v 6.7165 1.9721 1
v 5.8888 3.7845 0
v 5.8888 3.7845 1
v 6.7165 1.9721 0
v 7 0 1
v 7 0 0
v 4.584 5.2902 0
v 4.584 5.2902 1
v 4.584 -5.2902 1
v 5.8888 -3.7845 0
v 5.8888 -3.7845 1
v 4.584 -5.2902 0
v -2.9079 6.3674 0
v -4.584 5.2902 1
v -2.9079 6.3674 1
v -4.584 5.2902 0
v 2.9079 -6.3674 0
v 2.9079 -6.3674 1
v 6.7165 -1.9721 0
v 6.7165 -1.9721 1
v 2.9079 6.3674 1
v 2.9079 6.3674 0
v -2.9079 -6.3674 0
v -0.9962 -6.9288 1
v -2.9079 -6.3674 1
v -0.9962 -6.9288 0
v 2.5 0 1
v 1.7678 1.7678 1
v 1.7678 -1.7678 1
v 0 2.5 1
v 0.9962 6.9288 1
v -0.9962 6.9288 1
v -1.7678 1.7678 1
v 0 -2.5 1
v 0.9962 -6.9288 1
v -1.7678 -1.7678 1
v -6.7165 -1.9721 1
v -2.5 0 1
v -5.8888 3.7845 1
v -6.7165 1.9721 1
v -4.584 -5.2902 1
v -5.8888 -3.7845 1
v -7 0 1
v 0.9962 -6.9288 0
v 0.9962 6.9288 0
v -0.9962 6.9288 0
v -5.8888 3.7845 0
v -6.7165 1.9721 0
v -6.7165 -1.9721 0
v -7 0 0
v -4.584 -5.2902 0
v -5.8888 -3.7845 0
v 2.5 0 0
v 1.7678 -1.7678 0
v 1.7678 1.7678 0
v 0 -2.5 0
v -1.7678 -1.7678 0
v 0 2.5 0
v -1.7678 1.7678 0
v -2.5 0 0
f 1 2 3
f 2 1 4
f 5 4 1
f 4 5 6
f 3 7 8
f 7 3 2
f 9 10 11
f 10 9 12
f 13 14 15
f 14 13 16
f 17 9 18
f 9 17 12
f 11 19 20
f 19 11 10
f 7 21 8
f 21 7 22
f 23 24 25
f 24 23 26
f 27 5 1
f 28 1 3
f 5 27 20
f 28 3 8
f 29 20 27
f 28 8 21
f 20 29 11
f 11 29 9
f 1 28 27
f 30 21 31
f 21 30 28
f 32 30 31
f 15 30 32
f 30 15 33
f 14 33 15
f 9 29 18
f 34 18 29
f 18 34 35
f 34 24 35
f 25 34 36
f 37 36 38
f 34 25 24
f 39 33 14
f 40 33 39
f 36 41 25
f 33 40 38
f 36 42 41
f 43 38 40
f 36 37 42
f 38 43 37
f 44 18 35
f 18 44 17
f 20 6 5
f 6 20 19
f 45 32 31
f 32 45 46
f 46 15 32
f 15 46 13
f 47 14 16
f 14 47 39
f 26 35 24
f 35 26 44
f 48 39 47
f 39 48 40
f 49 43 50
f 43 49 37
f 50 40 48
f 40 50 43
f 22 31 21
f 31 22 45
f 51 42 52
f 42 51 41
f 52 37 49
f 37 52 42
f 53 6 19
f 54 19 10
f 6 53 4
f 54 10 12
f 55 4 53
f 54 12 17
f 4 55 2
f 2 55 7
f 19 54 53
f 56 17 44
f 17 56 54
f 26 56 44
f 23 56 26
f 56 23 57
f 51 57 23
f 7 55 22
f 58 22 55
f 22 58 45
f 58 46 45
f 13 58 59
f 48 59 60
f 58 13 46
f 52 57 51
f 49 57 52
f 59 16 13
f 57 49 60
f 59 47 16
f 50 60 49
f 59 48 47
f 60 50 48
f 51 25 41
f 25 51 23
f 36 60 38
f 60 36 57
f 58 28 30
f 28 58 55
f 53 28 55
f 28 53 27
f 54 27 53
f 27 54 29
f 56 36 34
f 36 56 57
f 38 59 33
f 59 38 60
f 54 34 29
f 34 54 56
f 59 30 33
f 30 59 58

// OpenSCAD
wall_thickness = 2;
floor_thickness = 4;
corner_radius = 2;

additional_front_padding = 8; // this should make things easier to assemble

esp_width = 52;
esp_depth = 29;
esp_height = 14;

display_outer_width = 27;
display_outer_height = 28;
display_width = 25;
display_height = 14.5;

button_width = 11;
button_height = 14;

front_plate_angle = 20;

epsilon = 0.01;

module esp_spacer() {
    height = 12.6 - 2.5 - 2 - 1.5;
    radius = 1.6;
    outer_radius = radius + 0.8;
    
    difference() {
        cylinder(height, outer_radius, outer_radius, $fn=64);
        cylinder(height, radius, radius, $fn=64);
    }
}

module rounded_rect(width, depth, height, corner_radius) {
    linear_extrude(height, center = false) {
        hull() {
            translate([corner_radius, corner_radius, 0])
                circle(corner_radius, $fn=64);
            translate([corner_radius, depth - corner_radius, 0])
                circle(corner_radius, $fn=64);
            translate([width - corner_radius, depth - corner_radius, 0])
                circle(corner_radius, $fn=64);
            translate([width - corner_radius, corner_radius, 0])
                circle(corner_radius, $fn=64);
        }
    }
}

module esp_mounts() {
    screw_radius = 1.6;
    nut_radius = 6.2 / 2;
    translate([wall_thickness - 1, wall_thickness, -epsilon]) {
        // mount 1
        translate([1.5 + screw_radius, 1 + screw_radius, 0])
            cylinder(floor_thickness + epsilon * 2, screw_radius, screw_radius, $fn=64);
        translate([1.5 + screw_radius, 1 + screw_radius, 0])
            cylinder(2.7, nut_radius, nut_radius, $fn=6);
        // mount 2
        translate([esp_width - 2 - screw_radius, 1 + screw_radius, 0])
            cylinder(floor_thickness + epsilon * 2, screw_radius, screw_radius, $fn=64);
        translate([esp_width - 2 - screw_radius, 1 + screw_radius, 0])
            cylinder(2.7, nut_radius, nut_radius, $fn=6);
        // mount 3
        translate([esp_width - 2 - screw_radius, esp_depth - 1 - screw_radius, 0])
            cylinder(floor_thickness + epsilon * 2, screw_radius, screw_radius, $fn=64);
        translate([esp_width - 2 - screw_radius, esp_depth - 1 - screw_radius, 0])
            cylinder(2.7, nut_radius, nut_radius, $fn=6);
        // mount 4
        translate([1.5 + screw_radius, esp_depth - 1 - screw_radius, 0])
            cylinder(floor_thickness + epsilon * 2, screw_radius, screw_radius, $fn=64);
        translate([1.5 + screw_radius, esp_depth - 1 - screw_radius, 0])
            cylinder(2.7, nut_radius, nut_radius, $fn=6);
    }
}
module esp_bolt_head_diff() {
    head_radius = 1.6;
    height = 20;
    translate([wall_thickness - 2, wall_thickness, -epsilon]) {
        // mount 1
        translate([1 + head_radius, 1 + head_radius, 0])
            cylinder(height + epsilon * 2, head_radius, head_radius, $fn=64);
        // mount 1
        translate([1 + head_radius, esp_depth - 1 - head_radius, 0])
            cylinder(height + epsilon * 2, head_radius, head_radius, $fn=64);
    }
}

module cooling_holes() {
    width = esp_width + wall_thickness * 2;
    depth = esp_depth + wall_thickness * 2;
    height = floor_thickness;
    
    translate([24, depth * 0.30 - 1.5, -epsilon]) {
        translate([0, 0, 0]) 
            rounded_rect(4, 3, height + epsilon * 2, 1);
        translate([6, 0, 0]) 
            rounded_rect(4, 3, height + epsilon * 2, 1);
        translate([12, 0, 0]) 
            rounded_rect(4, 3, height + epsilon * 2, 1);
        translate([18, 0, 0]) 
            rounded_rect(4, 3, height + epsilon * 2, 1);
    }
    translate([24, depth * 0.70 - 1.5, -epsilon]) {
        translate([0, 0, 0]) 
            rounded_rect(4, 3, height + epsilon * 2, 1);
        translate([6, 0, 0]) 
            rounded_rect(4, 3, height + epsilon * 2, 1);
        translate([12, 0, 0]) 
            rounded_rect(4, 3, height + epsilon * 2, 1);
        translate([18, 0, 0]) 
            rounded_rect(4, 3, height + epsilon * 2, 1);
    }
    translate([24 + 3, depth * 0.50 - 1.5, -epsilon]) {
        translate([0, 0, 0]) 
            rounded_rect(4, 3, height + epsilon * 2, 1);
        translate([6, 0, 0]) 
            rounded_rect(4, 3, height + epsilon * 2, 1);
        translate([12, 0, 0]) 
            rounded_rect(4, 3, height + epsilon * 2, 1);
    }
}

module usb_hole() {
    depth = 9;
    height = 3.5;
    translate([-epsilon, wall_thickness + 10, floor_thickness + 7 - height]) {
        cube([10, depth, height], center = false);
    }
}

module bottom_plate() {
    width = esp_width + wall_thickness * 2;
    depth = esp_depth + wall_thickness * 2 + additional_front_padding;
    height = floor_thickness;
    
    difference() {
        rounded_rect(width, depth, height, corner_radius);
        translate([0, additional_front_padding,0]) {
            esp_mounts();
            cooling_holes();
        }
    }
}

module bottom_walls() {
    width = esp_width + wall_thickness * 2;
    depth = esp_depth + wall_thickness * 2 + additional_front_padding;
    height = 7;
    
    difference() {
        translate([0, 0, floor_thickness]) {
            difference() {
                rounded_rect(width, depth, height, corner_radius);
                translate([wall_thickness, wall_thickness, -epsilon])
                    rounded_rect(esp_width, esp_depth + additional_front_padding, height + epsilon * 2, 1);
            }
        }
        translate([0, additional_front_padding,0]) {
            usb_hole();
            esp_bolt_head_diff();
        }
    }
}

module bottom() {
    union() {
        bottom_plate();
        bottom_walls();
    }
}

module front_wall() {
    width = esp_width + wall_thickness * 2;
    height = display_outer_height + 4;
    difference() {
        hull() {
            translate([corner_radius, corner_radius, 0])
                cylinder(height, corner_radius, corner_radius, $fn=64);
            translate([width - corner_radius, corner_radius, 0])
                cylinder(height, corner_radius, corner_radius, $fn=64);
            translate([corner_radius, corner_radius, 0])
                sphere(corner_radius, $fn=64);
            translate([width - corner_radius, corner_radius, 0])
                sphere(corner_radius, $fn=64);
            translate([corner_radius, corner_radius, height])
                sphere(corner_radius, $fn=64);
            translate([width - corner_radius, corner_radius, height])
                sphere(corner_radius, $fn=64);
        }
        // making front wall thinner, as half of corner diameter
        translate([0, corner_radius, -corner_radius])
            cube([width, 5, height + corner_radius * 2], center = false);
    }
}

module display_slot_outline() {
    translate([wall_thickness + 4, -epsilon, 2])
        cube([display_outer_width, wall_thickness * 2 + epsilon * 2, display_outer_height], center = false);
}
module display_slot() {
    translate([wall_thickness + 4, 0, 2]) {
        union() {
            difference() {
                // same as slot outline
                cube([display_outer_width, wall_thickness + epsilon * 2, display_outer_height], center = false);
                // display hole
                translate([1, -epsilon, 5.5 + 2.5])
                    cube([display_width, wall_thickness * 2 + epsilon * 2, display_height], center = false);
                // display lower strip
                translate([1, 0.6, 5.5])
                    cube([display_width, wall_thickness * 2 + epsilon * 2, display_height], center = false);
                // display connector
                translate([display_outer_height / 2 - 5, 0.2, 0])
                    cube([10, wall_thickness * 2 + epsilon * 2, display_height], center = false);
                // display pcb
                translate([0, 1.2, 0])
                    cube([display_outer_width, wall_thickness * 2 + epsilon * 2, display_outer_height], center = false);
            }
            // pocket
            translate([0, 3.5, 0]) {
                cube([display_outer_width, 1.2, display_outer_height * 0.5], center = false);
            }
            translate([0, 0, -1.2]) {
                cube([display_outer_width, 3.5 + 1.2, 1.2], center = false);
            }
            translate([-1.2, 0, -1.2]) {
                cube([1.2, 3.5 + 1.2, display_outer_height * 0.4], center = false);
            }
            translate([display_outer_width, 0, -1.2]) {
                cube([1.2, 3.5 + 1.2, display_outer_height * 0.4], center = false);
            }
        }
    }
}


module button_up_slot_outline() {
    full_width = esp_width + wall_thickness * 2;
    translate([full_width - button_height - 4, -epsilon, display_outer_height - button_height + 5])
        cube([button_height, wall_thickness * 2 + epsilon * 2, button_width], center = false);
}
module button_up_slot() {
    full_width = esp_width + wall_thickness * 2;
    pcb_height = 2;
    
    translate([full_width - button_height - 4, 0, display_outer_height - button_height + 5]) {
        union() {
            difference() {
                union() {
                    cube([button_height, wall_thickness, button_width], center = false);
                    translate([-1, 1, -1]) {
                        cube([3, 3, 3], center = false);
                    }
                }
                translate([0, 1.2, 0]) {
                    cube([button_height, wall_thickness + epsilon * 2, button_width], center = false);
                }
            }
            // pad
            translate([button_height * 0.4, 0, -1.2]) {
                difference() {
                    cube([button_height * 0.6, 1.2 + pcb_height + 1 + 1.2, button_width + 2.4], center = false);
                        
                    translate([-epsilon, 0, 1.2]) {
                        cube([button_height * 0.6, 1.2 + pcb_height + 1, button_width], center = false);
                    }
                }
                
            }
        }
    }
}
module button_down_slot_outline() {
    full_width = esp_width + wall_thickness * 2;
    translate([full_width - button_height - 4, -epsilon, 2])
        cube([button_height, wall_thickness * 2 + epsilon * 2, button_width], center = false);
}
module button_down_slot() {
    full_width = esp_width + wall_thickness * 2;
    pcb_height = 2;
    
    translate([full_width - button_height - 4, 0, 2]) {
        union() {
            difference() {
                union() {
                    cube([button_height, wall_thickness, button_width], center = false);
                    translate([-1, 1, -1]) {
                        cube([3, 3, 3], center = false);
                    }
                }
                translate([0, 1.2, 0]) {
                    cube([button_height, wall_thickness + epsilon * 2, button_width], center = false);
                }
            }
            // pad
            translate([button_height * 0.4, 0, -1.2]) {
                difference() {
                    cube([button_height * 0.6, 1.2 + pcb_height + 1 + 1.2, button_width + 2.4], center = false);
                    translate([-epsilon, 0, 1.2]) {
                        cube([button_height * 0.6, 1.2 + pcb_height + 1, button_width], center = false);
                    }
                }
                
            }
        }
    }
}

module led_slot_outline() {
    led_radius = 2;
    pcb_radius = 7;
    translate([0, 0, -epsilon]) {
        union() {
            cylinder(wall_thickness + epsilon * 2, led_radius, led_radius, $fn = 64);
            cylinder(wall_thickness / 2, pcb_radius, pcb_radius, $fn = 64);
            // todo make nested circle for diffusor?
        }
    }
}

module led_slot() {
    pcb_radius = 7;
    translate([0, 0, -wall_thickness]) {
        difference() {
            union() {
                translate([-pcb_radius - 1, 0, -1.2])
                    cube([2, 2, 2 + 1.2], center = false);
                translate([pcb_radius - 1, 0, -1.2])
                    cube([2, 2, 2 + 1.2], center = false);
                translate([0, -pcb_radius - 1,  -1.2])
                    cube([2, 2, 2 + 1.2], center = false);
                translate([0, pcb_radius - 1,  0])
                    cube([2, 2, 2 ], center = false);
            }
            cylinder(2, pcb_radius, pcb_radius, $fn = 64);
        }
    }
}


module button_ok_slot_outline() {
    translate([0, 0, -epsilon])
        cube([button_height, button_width, wall_thickness * 2 + epsilon * 2 ], center = false);
}
module button_ok_slot() {
    pcb_height = 2;
    
    translate([0, 0, 0]) {
        difference() {
            union() {
                cube([button_height, button_width, wall_thickness ], center = false);
                translate([-1, -1, -2]) {
                    cube([3, 3, 3], center = false);
                }
                translate([-1, button_width - 1, -2]) {
                    cube([3, 3, 3], center = false);
                }
                translate([button_height * 0.6, -1.2, -2]) {
                    cube([button_height * 0.4 + 1.2, button_width + 2.4, 4], center = false);
                }
            }
            translate([0, 0, -pcb_height + 1.2]) {
                cube([button_height, button_width, pcb_height], center = false);
            }
        }
    }
}

module top_wall(width, depth, height) {
    // remove rounded corners from front
    union() {
        rounded_rect(width, depth - 2, height, corner_radius);
        cube([width, depth / 2, height], center = false); 
    }
}


module front_plate() {
    full_width = esp_width + wall_thickness * 2;
    
    union() {
        // front wall with rough holes for components
        difference() {
            front_wall();
            display_slot_outline();
            button_up_slot_outline();
            button_down_slot_outline();
            
            translate([1, corner_radius + 1, 32])
            rotate([0, 90, 0])
                cylinder(full_width - 2, corner_radius, corner_radius, $fn = 64);
        }
        // detailed component slots
        display_slot();
        button_up_slot();
        button_down_slot();
        
        
    }
}

module top_plate() {
    width = esp_width + wall_thickness; // * 2; // half of wall_thickness will be rails for each side
    full_depth = esp_depth + wall_thickness * 2 + additional_front_padding;
    
    front_wall_length = display_outer_height + 4;
    front_wall_x_diff = cos(90 - front_plate_angle) * front_wall_length;
    depth = full_depth - front_wall_x_diff - corner_radius;
    
    height = wall_thickness;
    
    union() {
        // top plate with rough holes for components
        difference() {
            top_wall(width, depth, height);
            translate([width / 2, depth * 0.3, 0])
                led_slot_outline();
            translate([width * 0.7, depth * 0.2, 0])
                button_ok_slot_outline();
        }
        
        translate([0.8, 0.8, height])
            top_wall(width - 0.4, depth - 0.4, 0.5);
        translate([width / 2, depth * 0.3, 0])
            led_slot();
        translate([width * 0.7, depth * 0.2, 0])
            button_ok_slot();
    }
}

module left_wall() {
    front_wall_length = display_outer_height + 4;
    front_wall_x_diff = cos(90 - front_plate_angle) * front_wall_length;
    
    front_plate_height = sin(90 - front_plate_angle) * front_wall_length;
    
    bottom_depth = esp_depth + wall_thickness * 2 + additional_front_padding - corner_radius * 2;
    top_depth = bottom_depth - front_wall_x_diff;
    
    difference() {
        hull() {
            union() {
                cube([wall_thickness, bottom_depth, 1], center = false);
                translate([corner_radius, front_wall_x_diff, front_plate_height])
                rotate([0, 90, 90])
                    cylinder(top_depth, corner_radius, corner_radius, $fn=64);
            }
        }
        translate([wall_thickness, 0, 0])
            cube([corner_radius, bottom_depth + epsilon, front_plate_height + corner_radius], center = false);
        translate([corner_radius + 1, 0, front_plate_height + 0.5])
        rotate([0, 90, 90])
                cylinder(bottom_depth + epsilon, corner_radius, corner_radius, $fn = 64);
    }
}


module right_wall() {
    front_wall_length = display_outer_height + 4;
    front_wall_x_diff = cos(90 - front_plate_angle) * front_wall_length;
    
    front_plate_height = sin(90 - front_plate_angle) * front_wall_length;
    
    bottom_depth = esp_depth + wall_thickness * 2 + additional_front_padding - corner_radius * 2;
    top_depth = bottom_depth - front_wall_x_diff;
    
    difference() {
        hull() {
            union() {
                cube([wall_thickness, bottom_depth, 1], center = false);
                translate([0, front_wall_x_diff, front_plate_height])
                rotate([0, 90, 90])
                    cylinder(top_depth, corner_radius, corner_radius, $fn=64);
            }
        }
        translate([-corner_radius, 0, 0])
            cube([corner_radius, bottom_depth + epsilon, front_plate_height + corner_radius], center = false);
        translate([-1, 0, front_plate_height + 0.5])
        rotate([0, 90, 90])
                cylinder(bottom_depth + epsilon, corner_radius, corner_radius, $fn = 64);
    }
}

module back_wall() {
    width = esp_width + wall_thickness * 2;
    depth = esp_depth + wall_thickness * 2 + additional_front_padding;
    
    
    front_wall_length = display_outer_height + 4;
    front_wall_x_diff = cos(90 - front_plate_angle) * front_wall_length;
    
    front_plate_height = sin(90 - front_plate_angle) * front_wall_length;
    height = front_plate_height + wall_thickness - 0.5; // assume we union this with top wall
    
    union() {
        translate([0, -depth + wall_thickness, 0]) {
            difference() {
                rounded_rect(width, depth, height - corner_radius + 0.5, corner_radius);
                translate([ -epsilon, -wall_thickness, -epsilon])
                    cube([width + epsilon * 2, depth, height + epsilon * 2], center = false);
            }
        }
        hull() {
            translate([corner_radius, 0, height - corner_radius + 0.5])
                sphere(corner_radius, $fn = 64);
            translate([width - corner_radius, 0, height - corner_radius + 0.5])
                sphere(corner_radius, $fn = 64);
        }
    }
}

// back plate and top plate will be one part
// front plate, sides and bottow will be second part

// add ears for screws on side panels


// testing parts

// bottom();

// esp_spacer();

//front_plate();

// top_plate();

// left_wall();
// right_wall();
// back_wall();



module alltogether() {
    width = esp_width + wall_thickness * 2;
    depth = esp_depth + wall_thickness * 2 + additional_front_padding;
    bottom_height = floor_thickness + 7;
    
    front_wall_length = display_outer_height + 4;
    front_wall_x_diff = cos(90 - front_plate_angle) * front_wall_length;
    
    front_plate_height = sin(90 - front_plate_angle) * front_wall_length;
    
    union() {
        bottom();
        translate([0, 0.12, bottom_height + 0.8])
        rotate([-front_plate_angle, 0, 0])
            front_plate();
        translate([wall_thickness / 2, front_wall_x_diff + corner_radius, bottom_height + front_plate_height - 0.5])
            top_plate();
        translate([0, depth - wall_thickness, bottom_height])
            back_wall();
        translate([0, corner_radius, bottom_height])
            left_wall();
        translate([width - corner_radius, corner_radius, bottom_height])
            right_wall();
    }
}

// alltogether();


module part1() {
    width = esp_width + wall_thickness * 2;
    depth = esp_depth + wall_thickness * 2 + additional_front_padding;
    bottom_height = floor_thickness + 7;
    
    front_wall_length = display_outer_height + 4;
    front_wall_x_diff = cos(90 - front_plate_angle) * front_wall_length;
    
    front_plate_height = sin(90 - front_plate_angle) * front_wall_length;
    
    union() {
        bottom();
        translate([0, 0.12, bottom_height + 0.8])
        rotate([-front_plate_angle, 0, 0])
            front_plate();
        /*translate([wall_thickness / 2, front_wall_x_diff + corner_radius, bottom_height + front_plate_height - 0.5])
            top_plate();
        translate([0, depth - wall_thickness, bottom_height])
            back_wall();*/
        translate([0, corner_radius, bottom_height])
            left_wall();
        translate([width - corner_radius, corner_radius, bottom_height])
            right_wall();
    }
}

module part2() {
    width = esp_width + wall_thickness * 2;
    depth = esp_depth + wall_thickness * 2 + additional_front_padding;
    bottom_height = floor_thickness + 7;
    
    front_wall_length = display_outer_height + 4;
    front_wall_x_diff = cos(90 - front_plate_angle) * front_wall_length;
    
    front_plate_height = sin(90 - front_plate_angle) * front_wall_length;
    
    union() {
        /*bottom();
        translate([0, 0.12, bottom_height + 0.8])
        rotate([-front_plate_angle, 0, 0])
            front_plate();*/
        translate([wall_thickness / 2, front_wall_x_diff + corner_radius, bottom_height + front_plate_height - 0.5])
            top_plate();
        translate([0, depth - wall_thickness, bottom_height])
            back_wall();
        /*translate([0, corner_radius, bottom_height])
            left_wall();
        translate([width - corner_radius, corner_radius, bottom_height])
            right_wall();*/
    }
}

// part1();
// part2();

// tpu parts
module tpu_button_pad() {
    cube([button_height, button_width, 1 ], center = false);
}

module tpu_led_pad1() {
    led_radius = 2;
    pcb_radius = 7;
    cylinder(1, pcb_radius, pcb_radius);
}
module tpu_led_pad2() {
    led_radius = 2.5;
    pcb_radius = 7;
    difference() {
        cylinder(1, pcb_radius, pcb_radius);
        cylinder(1, led_radius, led_radius);
    }
}

// button_pad();
// tpu_led_pad1();
tpu_led_pad2();
